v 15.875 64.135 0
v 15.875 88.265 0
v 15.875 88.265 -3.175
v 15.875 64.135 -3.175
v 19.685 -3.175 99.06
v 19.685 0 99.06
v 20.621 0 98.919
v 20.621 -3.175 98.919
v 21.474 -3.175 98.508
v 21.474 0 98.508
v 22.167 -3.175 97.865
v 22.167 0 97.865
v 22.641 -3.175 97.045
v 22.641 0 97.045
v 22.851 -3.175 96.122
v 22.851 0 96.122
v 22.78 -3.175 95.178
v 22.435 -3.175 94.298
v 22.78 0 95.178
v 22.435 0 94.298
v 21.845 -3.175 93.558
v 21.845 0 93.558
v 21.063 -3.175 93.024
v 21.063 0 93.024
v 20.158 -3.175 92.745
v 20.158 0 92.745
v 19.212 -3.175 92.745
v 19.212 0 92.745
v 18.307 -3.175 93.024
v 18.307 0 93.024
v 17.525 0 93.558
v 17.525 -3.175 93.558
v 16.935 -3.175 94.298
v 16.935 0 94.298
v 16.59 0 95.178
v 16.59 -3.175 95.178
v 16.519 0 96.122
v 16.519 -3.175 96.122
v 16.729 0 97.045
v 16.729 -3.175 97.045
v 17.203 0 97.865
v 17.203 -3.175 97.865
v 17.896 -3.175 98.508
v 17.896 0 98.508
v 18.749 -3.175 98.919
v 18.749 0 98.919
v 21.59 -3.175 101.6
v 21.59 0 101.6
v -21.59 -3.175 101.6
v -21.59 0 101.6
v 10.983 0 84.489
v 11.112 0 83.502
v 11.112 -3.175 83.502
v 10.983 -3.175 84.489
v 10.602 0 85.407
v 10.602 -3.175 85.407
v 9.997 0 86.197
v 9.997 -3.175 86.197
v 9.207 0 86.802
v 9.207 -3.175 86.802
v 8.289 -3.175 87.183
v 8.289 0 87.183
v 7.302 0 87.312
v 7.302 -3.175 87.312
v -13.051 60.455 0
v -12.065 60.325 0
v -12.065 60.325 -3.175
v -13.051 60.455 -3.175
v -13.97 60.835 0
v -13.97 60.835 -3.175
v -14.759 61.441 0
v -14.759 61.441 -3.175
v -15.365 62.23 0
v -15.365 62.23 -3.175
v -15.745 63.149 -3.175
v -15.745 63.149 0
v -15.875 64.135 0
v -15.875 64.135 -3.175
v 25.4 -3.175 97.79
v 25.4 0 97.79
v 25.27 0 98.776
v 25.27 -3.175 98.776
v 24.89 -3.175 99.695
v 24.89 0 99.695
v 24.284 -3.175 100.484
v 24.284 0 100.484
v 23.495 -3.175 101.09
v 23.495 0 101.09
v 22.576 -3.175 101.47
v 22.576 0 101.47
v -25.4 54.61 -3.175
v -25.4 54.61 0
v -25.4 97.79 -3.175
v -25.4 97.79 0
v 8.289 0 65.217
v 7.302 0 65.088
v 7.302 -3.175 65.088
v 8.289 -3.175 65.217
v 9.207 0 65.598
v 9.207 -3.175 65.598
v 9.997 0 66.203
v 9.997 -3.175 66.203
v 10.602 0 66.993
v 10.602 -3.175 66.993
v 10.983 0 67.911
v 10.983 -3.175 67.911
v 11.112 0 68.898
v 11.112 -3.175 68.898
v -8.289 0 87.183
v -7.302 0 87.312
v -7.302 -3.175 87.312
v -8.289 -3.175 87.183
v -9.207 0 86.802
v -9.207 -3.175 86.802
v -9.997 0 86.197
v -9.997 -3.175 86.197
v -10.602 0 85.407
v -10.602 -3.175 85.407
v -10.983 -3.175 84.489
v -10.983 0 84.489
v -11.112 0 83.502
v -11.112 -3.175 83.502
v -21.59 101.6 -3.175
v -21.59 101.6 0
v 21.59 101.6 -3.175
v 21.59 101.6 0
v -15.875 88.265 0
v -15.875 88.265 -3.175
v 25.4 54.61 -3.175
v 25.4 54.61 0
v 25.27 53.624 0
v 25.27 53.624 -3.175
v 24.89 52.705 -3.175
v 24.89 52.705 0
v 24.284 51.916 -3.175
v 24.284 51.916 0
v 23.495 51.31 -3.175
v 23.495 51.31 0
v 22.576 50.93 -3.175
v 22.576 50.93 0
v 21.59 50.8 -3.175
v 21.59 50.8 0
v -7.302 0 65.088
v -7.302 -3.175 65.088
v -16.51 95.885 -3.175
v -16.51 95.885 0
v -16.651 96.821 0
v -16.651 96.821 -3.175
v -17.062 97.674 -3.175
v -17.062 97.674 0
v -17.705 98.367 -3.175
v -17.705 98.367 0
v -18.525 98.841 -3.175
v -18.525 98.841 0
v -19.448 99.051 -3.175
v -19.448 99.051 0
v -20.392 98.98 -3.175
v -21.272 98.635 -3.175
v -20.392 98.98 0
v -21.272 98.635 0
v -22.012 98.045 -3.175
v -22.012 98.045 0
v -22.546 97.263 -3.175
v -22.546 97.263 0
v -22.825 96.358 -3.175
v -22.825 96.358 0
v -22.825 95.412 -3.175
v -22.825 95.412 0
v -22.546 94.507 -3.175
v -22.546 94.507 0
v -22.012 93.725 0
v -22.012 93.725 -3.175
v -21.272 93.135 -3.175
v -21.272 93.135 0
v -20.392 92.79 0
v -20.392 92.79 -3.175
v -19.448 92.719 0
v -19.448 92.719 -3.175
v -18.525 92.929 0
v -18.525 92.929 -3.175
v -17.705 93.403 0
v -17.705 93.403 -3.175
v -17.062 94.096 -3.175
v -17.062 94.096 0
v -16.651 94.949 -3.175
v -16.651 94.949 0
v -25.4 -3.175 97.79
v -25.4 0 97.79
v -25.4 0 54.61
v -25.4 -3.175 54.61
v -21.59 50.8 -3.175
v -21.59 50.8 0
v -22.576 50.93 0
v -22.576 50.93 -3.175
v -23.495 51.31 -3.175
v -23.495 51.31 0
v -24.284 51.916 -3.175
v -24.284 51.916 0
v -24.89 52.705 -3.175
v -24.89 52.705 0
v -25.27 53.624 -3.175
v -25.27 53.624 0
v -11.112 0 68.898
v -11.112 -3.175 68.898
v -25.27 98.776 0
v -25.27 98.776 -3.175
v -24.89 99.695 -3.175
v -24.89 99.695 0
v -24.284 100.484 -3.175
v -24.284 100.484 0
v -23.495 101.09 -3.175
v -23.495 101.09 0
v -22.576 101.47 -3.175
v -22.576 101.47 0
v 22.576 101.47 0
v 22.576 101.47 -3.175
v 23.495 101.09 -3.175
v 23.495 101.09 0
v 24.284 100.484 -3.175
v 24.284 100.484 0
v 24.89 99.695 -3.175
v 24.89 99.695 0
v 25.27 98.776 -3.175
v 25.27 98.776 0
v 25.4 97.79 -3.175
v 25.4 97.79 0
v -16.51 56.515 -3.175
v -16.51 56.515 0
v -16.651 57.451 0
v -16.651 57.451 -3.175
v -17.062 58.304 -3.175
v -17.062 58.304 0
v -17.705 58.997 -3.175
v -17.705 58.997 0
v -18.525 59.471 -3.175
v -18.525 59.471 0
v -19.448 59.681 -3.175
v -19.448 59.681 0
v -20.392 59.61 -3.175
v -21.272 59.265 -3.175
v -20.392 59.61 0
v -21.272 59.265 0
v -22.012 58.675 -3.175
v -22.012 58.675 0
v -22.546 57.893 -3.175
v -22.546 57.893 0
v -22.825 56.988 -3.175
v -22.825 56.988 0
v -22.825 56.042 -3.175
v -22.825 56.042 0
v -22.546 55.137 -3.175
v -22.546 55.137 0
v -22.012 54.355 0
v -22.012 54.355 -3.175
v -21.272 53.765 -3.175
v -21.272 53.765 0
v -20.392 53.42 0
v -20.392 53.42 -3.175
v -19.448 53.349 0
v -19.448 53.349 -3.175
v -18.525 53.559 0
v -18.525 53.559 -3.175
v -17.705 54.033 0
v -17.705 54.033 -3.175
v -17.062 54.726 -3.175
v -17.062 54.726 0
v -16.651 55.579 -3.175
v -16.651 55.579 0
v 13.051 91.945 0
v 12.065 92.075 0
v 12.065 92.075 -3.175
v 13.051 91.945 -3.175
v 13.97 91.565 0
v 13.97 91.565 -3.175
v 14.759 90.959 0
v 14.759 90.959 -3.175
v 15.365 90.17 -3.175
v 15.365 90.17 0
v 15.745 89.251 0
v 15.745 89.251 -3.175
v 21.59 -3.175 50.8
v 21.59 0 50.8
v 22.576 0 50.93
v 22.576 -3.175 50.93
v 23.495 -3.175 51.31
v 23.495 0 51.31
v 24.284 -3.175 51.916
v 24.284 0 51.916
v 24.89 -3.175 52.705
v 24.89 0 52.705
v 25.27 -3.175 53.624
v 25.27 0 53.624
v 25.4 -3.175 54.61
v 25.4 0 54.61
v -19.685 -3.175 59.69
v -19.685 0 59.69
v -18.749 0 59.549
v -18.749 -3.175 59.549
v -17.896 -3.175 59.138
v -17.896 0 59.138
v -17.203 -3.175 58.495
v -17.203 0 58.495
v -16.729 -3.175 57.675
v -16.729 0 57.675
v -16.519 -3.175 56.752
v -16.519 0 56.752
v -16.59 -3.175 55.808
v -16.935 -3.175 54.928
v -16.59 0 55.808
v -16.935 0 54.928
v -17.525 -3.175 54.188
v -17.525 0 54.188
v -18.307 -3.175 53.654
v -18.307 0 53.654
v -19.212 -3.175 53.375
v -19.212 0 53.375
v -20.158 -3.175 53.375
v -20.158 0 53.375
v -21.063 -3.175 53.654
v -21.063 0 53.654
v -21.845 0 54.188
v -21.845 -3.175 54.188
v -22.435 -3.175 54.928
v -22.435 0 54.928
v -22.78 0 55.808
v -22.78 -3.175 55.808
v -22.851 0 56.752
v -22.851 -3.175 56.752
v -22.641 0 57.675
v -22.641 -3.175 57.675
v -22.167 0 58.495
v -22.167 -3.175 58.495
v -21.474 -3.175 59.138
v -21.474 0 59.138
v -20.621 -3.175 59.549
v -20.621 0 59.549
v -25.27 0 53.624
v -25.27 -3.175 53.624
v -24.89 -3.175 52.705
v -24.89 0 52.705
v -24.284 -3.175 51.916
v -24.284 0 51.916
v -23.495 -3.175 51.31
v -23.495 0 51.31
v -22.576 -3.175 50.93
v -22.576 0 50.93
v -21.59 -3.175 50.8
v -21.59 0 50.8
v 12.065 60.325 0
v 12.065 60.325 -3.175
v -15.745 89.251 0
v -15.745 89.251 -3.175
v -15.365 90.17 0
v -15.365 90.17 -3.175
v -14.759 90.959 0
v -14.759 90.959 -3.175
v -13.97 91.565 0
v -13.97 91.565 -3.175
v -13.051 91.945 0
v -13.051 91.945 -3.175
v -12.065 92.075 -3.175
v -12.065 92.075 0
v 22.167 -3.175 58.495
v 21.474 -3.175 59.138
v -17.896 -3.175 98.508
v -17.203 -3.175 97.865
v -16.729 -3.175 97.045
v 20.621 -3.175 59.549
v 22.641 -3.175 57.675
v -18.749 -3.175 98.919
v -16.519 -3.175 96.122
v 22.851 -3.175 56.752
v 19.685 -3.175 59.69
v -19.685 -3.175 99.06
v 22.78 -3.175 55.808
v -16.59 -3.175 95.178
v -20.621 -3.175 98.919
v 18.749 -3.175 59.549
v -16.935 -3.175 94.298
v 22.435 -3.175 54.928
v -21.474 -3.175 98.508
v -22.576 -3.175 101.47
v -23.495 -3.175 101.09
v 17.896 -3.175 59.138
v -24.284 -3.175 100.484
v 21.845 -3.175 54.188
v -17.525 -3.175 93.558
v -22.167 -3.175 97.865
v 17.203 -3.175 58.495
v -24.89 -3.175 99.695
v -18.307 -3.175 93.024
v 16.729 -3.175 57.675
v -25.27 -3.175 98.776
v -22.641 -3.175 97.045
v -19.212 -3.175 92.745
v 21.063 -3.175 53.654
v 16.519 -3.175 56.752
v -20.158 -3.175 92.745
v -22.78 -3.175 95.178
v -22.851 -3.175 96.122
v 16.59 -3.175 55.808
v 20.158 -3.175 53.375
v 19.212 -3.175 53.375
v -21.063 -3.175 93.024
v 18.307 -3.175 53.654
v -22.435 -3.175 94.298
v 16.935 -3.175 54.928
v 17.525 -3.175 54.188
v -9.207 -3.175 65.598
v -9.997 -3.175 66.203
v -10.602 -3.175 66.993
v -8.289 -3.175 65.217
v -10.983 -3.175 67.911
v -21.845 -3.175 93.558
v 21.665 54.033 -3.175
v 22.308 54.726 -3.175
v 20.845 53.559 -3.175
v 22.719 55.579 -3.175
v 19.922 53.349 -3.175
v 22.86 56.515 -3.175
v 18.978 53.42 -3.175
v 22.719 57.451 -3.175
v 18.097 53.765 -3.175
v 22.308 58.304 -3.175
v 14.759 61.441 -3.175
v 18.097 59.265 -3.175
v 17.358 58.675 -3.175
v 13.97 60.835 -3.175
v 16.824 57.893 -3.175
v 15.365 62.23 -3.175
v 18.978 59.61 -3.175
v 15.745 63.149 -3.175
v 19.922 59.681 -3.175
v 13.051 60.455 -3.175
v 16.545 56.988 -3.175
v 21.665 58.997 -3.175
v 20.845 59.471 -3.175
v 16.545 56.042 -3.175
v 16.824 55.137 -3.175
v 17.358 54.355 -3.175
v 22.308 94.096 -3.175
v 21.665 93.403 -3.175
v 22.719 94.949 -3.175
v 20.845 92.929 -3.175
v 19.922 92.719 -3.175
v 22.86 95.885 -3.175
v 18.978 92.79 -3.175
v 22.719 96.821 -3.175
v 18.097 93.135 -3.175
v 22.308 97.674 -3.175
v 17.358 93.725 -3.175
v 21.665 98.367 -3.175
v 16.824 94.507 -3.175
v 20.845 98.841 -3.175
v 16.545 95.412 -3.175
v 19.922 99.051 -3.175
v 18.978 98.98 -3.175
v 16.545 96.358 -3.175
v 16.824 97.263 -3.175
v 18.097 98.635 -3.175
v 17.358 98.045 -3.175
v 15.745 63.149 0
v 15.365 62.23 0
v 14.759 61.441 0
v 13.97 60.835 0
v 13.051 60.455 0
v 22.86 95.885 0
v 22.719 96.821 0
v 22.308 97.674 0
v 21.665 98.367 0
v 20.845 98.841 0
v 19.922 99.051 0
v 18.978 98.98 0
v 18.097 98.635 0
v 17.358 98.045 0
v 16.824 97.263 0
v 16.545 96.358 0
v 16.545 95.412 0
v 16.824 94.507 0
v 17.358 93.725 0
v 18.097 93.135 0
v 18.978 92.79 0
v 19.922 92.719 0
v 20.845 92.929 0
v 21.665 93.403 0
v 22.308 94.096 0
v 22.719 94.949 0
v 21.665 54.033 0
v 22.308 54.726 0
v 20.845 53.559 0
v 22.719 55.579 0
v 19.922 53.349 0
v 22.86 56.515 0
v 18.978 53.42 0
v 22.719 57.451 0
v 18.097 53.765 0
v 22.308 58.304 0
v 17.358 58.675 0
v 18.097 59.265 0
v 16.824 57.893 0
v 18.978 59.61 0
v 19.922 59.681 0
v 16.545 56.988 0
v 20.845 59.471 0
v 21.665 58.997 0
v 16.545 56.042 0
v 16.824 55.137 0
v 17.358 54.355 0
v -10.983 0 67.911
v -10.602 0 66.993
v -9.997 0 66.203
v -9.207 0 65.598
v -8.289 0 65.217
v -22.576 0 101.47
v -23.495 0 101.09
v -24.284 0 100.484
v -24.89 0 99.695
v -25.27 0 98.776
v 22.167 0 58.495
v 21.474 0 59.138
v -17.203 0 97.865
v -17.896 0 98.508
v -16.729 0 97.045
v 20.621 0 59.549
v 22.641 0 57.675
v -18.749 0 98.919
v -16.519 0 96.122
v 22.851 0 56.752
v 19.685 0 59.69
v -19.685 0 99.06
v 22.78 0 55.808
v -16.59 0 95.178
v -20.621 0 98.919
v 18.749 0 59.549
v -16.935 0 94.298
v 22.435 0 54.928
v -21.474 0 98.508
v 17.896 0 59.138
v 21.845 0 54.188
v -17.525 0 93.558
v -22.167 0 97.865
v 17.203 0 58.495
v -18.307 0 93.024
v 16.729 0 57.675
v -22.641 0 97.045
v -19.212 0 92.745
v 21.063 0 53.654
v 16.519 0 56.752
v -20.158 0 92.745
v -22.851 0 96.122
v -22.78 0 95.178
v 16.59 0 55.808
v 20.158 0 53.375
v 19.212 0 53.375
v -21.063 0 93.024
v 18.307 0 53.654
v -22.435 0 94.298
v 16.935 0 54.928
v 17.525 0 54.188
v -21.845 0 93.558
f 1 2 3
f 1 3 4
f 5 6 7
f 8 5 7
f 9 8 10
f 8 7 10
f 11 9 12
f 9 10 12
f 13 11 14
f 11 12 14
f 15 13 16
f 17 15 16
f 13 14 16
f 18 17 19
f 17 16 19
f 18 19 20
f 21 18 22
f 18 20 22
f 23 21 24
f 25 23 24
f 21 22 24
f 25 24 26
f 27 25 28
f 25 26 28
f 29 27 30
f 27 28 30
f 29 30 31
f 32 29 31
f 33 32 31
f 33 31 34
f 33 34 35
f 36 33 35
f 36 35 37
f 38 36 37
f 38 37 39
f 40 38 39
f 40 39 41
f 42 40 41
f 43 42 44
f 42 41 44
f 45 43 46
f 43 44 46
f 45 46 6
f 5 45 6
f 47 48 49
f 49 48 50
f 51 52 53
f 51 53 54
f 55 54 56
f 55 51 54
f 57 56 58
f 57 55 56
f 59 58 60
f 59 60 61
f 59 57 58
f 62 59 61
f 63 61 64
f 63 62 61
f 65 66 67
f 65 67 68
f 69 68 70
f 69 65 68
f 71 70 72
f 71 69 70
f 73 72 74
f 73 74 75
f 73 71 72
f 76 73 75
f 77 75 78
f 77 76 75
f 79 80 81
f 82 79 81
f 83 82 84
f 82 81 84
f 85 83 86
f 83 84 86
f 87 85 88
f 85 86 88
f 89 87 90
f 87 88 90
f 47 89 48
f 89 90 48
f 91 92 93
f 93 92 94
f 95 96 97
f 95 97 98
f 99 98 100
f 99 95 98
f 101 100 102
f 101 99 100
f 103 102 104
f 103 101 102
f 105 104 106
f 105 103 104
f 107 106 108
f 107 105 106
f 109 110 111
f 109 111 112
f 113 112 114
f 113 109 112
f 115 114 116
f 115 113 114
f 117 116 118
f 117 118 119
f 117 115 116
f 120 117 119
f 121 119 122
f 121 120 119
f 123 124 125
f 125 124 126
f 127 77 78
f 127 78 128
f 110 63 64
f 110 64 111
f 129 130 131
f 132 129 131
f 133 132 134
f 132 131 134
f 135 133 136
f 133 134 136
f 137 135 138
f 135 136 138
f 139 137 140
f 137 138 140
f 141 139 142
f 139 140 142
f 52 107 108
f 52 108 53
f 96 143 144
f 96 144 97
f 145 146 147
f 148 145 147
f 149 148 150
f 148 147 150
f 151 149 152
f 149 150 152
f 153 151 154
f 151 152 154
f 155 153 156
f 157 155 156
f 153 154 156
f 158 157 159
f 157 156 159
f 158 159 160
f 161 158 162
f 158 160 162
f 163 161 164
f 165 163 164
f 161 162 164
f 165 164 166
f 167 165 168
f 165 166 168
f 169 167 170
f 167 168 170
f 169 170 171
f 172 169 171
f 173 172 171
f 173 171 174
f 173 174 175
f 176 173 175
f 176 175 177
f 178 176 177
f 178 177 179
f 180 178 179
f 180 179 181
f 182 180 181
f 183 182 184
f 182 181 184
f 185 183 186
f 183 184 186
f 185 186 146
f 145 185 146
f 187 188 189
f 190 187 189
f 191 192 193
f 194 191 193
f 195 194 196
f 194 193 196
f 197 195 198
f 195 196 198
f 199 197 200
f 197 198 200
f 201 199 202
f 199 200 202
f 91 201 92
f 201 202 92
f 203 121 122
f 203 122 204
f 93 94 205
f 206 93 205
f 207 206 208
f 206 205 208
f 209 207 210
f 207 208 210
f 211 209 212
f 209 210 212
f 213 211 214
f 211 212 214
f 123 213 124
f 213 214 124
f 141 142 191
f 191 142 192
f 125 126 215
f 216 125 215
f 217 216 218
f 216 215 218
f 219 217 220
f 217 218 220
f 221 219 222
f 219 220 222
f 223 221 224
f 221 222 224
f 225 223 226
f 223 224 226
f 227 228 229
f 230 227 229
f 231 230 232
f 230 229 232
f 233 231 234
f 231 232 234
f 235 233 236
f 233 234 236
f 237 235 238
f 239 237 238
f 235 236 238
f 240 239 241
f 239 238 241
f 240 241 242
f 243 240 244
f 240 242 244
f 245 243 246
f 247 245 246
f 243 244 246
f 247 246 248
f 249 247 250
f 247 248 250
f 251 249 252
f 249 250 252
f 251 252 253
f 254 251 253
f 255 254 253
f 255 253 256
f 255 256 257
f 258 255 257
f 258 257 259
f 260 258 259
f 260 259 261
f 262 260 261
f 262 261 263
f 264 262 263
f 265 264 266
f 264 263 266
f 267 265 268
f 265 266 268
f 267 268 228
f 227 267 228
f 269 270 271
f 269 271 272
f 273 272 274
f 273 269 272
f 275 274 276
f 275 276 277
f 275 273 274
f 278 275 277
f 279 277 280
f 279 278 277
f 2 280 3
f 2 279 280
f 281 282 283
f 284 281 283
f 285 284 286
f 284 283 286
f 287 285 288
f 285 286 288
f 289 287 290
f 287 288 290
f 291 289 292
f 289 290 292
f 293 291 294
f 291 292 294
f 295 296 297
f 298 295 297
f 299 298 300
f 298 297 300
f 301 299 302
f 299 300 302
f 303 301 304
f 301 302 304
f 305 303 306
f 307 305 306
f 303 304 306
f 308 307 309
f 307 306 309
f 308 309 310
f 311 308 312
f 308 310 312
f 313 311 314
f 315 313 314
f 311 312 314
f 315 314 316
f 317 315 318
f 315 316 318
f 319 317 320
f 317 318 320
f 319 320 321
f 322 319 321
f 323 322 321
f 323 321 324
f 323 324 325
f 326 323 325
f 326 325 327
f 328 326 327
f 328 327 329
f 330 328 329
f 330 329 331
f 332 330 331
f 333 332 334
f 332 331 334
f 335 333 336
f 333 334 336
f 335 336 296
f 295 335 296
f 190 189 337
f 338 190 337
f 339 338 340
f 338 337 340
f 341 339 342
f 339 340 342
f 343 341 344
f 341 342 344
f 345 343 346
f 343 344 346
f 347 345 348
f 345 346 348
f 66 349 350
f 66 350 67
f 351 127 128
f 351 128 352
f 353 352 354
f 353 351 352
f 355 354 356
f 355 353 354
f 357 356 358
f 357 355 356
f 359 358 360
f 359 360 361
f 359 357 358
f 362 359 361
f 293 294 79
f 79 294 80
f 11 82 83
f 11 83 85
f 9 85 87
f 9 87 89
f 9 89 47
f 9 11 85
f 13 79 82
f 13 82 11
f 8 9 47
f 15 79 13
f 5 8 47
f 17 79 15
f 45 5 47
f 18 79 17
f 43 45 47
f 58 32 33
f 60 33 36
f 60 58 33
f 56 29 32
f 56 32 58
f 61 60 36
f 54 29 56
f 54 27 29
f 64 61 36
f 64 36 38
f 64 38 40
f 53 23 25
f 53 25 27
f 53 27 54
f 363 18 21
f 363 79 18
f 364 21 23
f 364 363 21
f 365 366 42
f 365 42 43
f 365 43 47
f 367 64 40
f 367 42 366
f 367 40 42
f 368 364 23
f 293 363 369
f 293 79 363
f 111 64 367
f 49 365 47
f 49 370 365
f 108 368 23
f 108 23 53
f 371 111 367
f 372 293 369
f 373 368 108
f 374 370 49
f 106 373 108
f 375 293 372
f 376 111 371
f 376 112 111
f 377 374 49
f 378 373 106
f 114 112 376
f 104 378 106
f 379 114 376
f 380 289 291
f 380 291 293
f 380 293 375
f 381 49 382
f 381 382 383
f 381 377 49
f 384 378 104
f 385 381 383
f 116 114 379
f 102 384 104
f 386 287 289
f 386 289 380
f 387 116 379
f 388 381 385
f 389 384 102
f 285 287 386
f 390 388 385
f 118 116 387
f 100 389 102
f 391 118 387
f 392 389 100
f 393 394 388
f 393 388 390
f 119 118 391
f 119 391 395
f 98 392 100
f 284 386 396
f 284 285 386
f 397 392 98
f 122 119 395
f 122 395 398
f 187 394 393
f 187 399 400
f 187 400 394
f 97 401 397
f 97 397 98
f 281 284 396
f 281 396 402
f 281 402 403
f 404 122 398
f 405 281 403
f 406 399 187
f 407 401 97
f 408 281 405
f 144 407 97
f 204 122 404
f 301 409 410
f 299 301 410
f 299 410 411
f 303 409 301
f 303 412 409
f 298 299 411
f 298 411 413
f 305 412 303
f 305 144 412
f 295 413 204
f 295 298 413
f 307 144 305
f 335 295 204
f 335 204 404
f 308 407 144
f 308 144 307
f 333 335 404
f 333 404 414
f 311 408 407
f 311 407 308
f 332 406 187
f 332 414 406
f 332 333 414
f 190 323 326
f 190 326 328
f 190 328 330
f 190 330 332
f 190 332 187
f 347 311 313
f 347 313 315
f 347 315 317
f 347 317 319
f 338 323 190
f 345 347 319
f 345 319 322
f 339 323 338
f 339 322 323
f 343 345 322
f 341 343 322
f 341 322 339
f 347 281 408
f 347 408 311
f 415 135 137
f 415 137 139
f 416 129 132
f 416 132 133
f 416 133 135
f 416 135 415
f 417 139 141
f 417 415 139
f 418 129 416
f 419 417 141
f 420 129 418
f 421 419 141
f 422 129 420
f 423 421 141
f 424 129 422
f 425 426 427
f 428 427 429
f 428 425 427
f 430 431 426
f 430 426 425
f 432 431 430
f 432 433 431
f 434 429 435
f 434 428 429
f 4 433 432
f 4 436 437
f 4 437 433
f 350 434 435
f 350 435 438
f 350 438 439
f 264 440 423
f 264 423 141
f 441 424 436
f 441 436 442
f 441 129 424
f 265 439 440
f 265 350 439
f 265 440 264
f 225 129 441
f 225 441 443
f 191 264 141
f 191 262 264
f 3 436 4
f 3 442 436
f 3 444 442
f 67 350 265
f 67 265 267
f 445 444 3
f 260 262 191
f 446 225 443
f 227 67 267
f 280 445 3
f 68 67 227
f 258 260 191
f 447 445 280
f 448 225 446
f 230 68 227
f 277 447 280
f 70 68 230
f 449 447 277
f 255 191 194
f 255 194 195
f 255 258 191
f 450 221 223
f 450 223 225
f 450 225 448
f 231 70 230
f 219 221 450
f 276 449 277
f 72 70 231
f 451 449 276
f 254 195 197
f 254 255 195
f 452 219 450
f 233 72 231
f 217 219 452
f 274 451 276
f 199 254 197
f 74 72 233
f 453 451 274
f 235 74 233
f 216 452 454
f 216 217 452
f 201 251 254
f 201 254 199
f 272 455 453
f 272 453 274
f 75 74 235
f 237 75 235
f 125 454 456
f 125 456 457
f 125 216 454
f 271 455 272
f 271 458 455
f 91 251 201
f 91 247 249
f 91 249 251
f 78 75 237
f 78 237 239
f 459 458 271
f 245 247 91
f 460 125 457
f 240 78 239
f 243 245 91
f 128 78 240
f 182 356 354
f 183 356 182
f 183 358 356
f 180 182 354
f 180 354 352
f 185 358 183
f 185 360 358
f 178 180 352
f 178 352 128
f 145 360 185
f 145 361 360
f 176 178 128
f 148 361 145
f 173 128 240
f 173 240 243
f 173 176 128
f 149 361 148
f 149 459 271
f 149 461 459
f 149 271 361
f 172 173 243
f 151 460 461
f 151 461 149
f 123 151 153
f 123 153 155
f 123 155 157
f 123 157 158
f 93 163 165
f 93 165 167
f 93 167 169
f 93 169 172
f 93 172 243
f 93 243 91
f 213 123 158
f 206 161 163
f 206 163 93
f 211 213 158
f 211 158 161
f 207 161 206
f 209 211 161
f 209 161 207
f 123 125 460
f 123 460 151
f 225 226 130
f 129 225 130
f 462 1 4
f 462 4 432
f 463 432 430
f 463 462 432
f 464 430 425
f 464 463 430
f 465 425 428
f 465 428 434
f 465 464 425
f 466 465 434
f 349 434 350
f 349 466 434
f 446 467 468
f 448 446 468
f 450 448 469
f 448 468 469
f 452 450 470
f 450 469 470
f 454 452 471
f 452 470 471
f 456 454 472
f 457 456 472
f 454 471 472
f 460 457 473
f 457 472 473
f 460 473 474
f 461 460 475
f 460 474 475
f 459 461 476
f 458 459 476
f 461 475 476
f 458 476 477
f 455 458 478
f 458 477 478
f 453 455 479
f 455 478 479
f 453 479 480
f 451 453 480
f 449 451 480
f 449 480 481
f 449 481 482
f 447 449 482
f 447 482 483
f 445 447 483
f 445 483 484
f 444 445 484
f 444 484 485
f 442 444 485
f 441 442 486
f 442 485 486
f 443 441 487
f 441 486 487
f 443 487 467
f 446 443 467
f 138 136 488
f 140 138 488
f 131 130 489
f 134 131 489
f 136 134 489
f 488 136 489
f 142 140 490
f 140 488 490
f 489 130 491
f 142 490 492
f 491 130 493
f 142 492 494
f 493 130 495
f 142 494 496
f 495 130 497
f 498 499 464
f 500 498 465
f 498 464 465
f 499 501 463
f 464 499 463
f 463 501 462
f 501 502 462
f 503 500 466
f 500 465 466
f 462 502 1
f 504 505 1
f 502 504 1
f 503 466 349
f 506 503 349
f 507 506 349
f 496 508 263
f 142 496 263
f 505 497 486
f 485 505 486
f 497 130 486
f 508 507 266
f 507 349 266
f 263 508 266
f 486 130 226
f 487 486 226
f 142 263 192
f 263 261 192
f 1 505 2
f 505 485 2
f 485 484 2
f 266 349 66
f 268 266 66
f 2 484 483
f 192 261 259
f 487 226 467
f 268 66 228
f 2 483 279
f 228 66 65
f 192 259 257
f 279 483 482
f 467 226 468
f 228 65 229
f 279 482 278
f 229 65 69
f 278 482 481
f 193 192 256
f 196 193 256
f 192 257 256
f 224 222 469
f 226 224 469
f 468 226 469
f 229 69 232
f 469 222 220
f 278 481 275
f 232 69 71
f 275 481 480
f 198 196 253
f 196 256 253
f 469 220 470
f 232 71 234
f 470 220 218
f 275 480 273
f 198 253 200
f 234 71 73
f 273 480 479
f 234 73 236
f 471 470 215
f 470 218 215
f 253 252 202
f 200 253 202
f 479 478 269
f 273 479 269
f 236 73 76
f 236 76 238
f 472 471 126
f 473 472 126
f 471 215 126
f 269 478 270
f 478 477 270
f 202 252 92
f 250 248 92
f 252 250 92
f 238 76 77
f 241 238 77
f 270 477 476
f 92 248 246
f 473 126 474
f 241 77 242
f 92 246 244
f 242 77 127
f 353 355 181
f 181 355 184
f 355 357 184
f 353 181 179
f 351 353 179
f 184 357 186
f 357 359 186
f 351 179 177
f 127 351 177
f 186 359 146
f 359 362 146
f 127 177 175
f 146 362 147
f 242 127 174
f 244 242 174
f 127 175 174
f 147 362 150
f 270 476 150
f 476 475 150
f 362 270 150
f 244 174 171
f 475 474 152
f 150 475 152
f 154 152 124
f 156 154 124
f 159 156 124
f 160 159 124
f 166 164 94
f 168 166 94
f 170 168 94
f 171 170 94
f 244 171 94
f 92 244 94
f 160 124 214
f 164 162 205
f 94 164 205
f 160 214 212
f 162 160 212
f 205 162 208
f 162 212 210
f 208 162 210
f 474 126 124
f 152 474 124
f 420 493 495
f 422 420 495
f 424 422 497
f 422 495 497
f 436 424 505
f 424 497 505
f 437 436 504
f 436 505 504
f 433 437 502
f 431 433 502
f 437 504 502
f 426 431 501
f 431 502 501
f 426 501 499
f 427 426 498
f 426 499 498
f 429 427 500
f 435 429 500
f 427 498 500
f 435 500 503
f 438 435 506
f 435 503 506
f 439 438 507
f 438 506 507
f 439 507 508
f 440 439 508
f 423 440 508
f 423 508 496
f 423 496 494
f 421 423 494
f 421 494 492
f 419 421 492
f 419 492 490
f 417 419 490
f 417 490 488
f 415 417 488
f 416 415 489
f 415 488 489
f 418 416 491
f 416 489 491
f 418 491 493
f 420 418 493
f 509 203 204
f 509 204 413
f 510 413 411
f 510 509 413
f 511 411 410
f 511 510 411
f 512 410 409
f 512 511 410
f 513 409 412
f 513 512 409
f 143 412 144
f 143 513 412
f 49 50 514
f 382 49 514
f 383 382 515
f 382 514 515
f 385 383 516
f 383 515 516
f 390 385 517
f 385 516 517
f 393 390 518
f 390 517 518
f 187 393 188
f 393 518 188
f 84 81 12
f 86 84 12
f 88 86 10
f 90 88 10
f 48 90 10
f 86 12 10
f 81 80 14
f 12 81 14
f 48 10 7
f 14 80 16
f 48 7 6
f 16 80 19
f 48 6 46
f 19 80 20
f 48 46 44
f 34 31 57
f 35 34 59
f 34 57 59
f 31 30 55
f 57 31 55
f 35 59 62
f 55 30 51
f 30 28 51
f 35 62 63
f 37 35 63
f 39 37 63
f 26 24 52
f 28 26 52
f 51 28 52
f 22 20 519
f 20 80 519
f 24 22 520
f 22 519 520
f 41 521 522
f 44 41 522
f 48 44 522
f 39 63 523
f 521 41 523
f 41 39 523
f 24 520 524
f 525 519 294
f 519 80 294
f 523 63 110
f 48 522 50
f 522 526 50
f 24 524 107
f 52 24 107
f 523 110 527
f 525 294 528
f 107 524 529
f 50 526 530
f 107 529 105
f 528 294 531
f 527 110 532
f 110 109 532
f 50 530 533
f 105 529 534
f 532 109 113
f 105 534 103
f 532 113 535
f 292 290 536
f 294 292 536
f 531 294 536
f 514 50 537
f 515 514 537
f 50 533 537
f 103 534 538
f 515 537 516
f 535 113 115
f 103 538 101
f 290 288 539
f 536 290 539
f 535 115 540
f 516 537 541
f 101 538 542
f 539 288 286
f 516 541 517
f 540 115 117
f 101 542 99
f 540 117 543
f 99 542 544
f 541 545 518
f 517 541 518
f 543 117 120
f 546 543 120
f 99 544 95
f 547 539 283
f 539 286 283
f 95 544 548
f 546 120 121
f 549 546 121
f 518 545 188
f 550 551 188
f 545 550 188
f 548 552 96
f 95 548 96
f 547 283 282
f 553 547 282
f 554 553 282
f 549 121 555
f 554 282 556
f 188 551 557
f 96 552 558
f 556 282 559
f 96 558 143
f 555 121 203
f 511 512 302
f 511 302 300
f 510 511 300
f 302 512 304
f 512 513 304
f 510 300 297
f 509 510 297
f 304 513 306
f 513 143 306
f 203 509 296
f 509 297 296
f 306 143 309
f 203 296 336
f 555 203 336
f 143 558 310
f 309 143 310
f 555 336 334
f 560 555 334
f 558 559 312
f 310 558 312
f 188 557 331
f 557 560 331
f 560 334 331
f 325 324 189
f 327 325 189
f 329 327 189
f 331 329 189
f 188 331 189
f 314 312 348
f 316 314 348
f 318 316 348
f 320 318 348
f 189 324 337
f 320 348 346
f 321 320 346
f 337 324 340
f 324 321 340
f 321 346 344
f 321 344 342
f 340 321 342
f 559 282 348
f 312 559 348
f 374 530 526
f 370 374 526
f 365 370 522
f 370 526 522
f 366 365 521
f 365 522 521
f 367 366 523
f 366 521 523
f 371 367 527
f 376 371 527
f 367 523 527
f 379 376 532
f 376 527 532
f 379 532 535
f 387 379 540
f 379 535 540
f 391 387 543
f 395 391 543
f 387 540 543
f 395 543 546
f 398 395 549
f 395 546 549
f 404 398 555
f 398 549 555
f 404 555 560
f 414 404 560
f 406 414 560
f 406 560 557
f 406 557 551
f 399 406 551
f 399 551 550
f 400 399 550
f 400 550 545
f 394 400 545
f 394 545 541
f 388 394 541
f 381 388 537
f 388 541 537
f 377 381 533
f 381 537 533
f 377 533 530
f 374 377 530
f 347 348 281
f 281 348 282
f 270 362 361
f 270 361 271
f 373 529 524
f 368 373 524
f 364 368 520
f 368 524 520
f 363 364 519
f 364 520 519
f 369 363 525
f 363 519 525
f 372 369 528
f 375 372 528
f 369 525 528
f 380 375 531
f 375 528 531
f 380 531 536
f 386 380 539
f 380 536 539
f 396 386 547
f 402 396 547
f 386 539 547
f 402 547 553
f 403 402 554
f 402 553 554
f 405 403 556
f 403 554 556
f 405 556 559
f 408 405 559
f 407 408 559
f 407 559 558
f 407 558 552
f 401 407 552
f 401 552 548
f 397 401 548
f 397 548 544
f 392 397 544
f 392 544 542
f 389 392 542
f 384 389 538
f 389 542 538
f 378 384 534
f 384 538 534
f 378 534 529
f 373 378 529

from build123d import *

# Parameters (mm, degrees)
SKETCH1_R           = 3.175
TOP_FLANGE_DEPTH    = 3.175
SKETCH2_R           = 3.175
BOTTOM_FLANGE_DEPTH = 3.175


with BuildPart() as part:
    # Sketch1 → Top-Flange (new body)
    with BuildSketch(Plane.XY):
        with BuildLine():
            Line((-21.59, 101.6), (21.59, 101.6))
            ThreePointArc((21.59, 101.6), (24.284076836, 100.484076836), (25.4, 97.79))
            Line((25.4, 97.79), (25.4, 54.61))
            ThreePointArc((25.4, 54.61), (24.284076836, 51.915923164), (21.59, 50.8))
            Line((21.59, 50.8), (-21.59, 50.8))
            ThreePointArc((-21.59, 50.8), (-24.284076836, 51.915923164), (-25.4, 54.61))
            Line((-25.4, 54.61), (-25.4, 97.79))
            ThreePointArc((-25.4, 97.79), (-24.284076836, 100.484076836), (-21.59, 101.6))
        make_face()
        with Locations((-19.685, 95.885)):
            Circle(SKETCH1_R, mode=Mode.SUBTRACT)
        with Locations((19.685, 95.885)):
            Circle(SKETCH1_R, mode=Mode.SUBTRACT)
        with Locations((-19.685, 56.515)):
            Circle(SKETCH1_R, mode=Mode.SUBTRACT)
        with Locations((19.685, 56.515)):
            Circle(SKETCH1_R, mode=Mode.SUBTRACT)
        with BuildLine():
            Line((-12.065, 92.075), (12.065, 92.075))
            ThreePointArc((12.065, 92.075), (14.759076836, 90.959076836), (15.875, 88.265))
            Line((15.875, 88.265), (15.875, 64.135))
            ThreePointArc((15.875, 64.135), (14.759076836, 61.440923164), (12.065, 60.325))
            Line((12.065, 60.325), (-12.065, 60.325))
            ThreePointArc((-12.065, 60.325), (-14.759076836, 61.440923164), (-15.875, 64.135))
            Line((-15.875, 64.135), (-15.875, 88.265))
            ThreePointArc((-15.875, 88.265), (-14.759076836, 90.959076836), (-12.065, 92.075))
        make_face(mode=Mode.SUBTRACT)
    extrude(amount=-TOP_FLANGE_DEPTH)


with BuildPart() as body_2:
    # Sketch2 → Bottom-Flange (new body)
    with BuildSketch(Plane(origin=(0, 0, 0), x_dir=(1, 0, 0), z_dir=(0, 1, 0))):
        with BuildLine():
            Line((-21.59, -50.8), (21.59, -50.8))
            ThreePointArc((21.59, -50.8), (24.284076836, -51.915923164), (25.4, -54.61))
            Line((25.4, -54.61), (25.4, -97.79))
            ThreePointArc((25.4, -97.79), (24.284076836, -100.484076836), (21.59, -101.6))
            Line((21.59, -101.6), (-21.59, -101.6))
            ThreePointArc((-21.59, -101.6), (-24.284076836, -100.484076836), (-25.4, -97.79))
            Line((-25.4, -97.79), (-25.4, -54.61))
            ThreePointArc((-25.4, -54.61), (-24.284076836, -51.915923164), (-21.59, -50.8))
        make_face()
        with Locations(Location((-19.685, -56.515, 0), (0, 0, 270))):  # turned: the seam where the file's is
            Circle(SKETCH2_R, mode=Mode.SUBTRACT)
        with Locations(Location((19.685, -56.515, 0), (0, 0, 270))):  # turned: the seam where the file's is
            Circle(SKETCH2_R, mode=Mode.SUBTRACT)
        with Locations(Location((-19.685, -95.885, 0), (0, 0, 270))):  # turned: the seam where the file's is
            Circle(SKETCH2_R, mode=Mode.SUBTRACT)
        with Locations(Location((19.685, -95.885, 0), (0, 0, 270))):  # turned: the seam where the file's is
            Circle(SKETCH2_R, mode=Mode.SUBTRACT)
        with BuildLine():
            Line((-7.3025, -65.0875), (7.3025, -65.0875))
            ThreePointArc((7.3025, -65.0875), (9.996576836, -66.203423164), (11.1125, -68.8975))
            Line((11.1125, -68.8975), (11.1125, -83.5025))
            ThreePointArc((11.1125, -83.5025), (9.996576836, -86.196576836), (7.3025, -87.3125))
            Line((7.3025, -87.3125), (-7.3025, -87.3125))
            ThreePointArc((-7.3025, -87.3125), (-9.996576836, -86.196576836), (-11.1125, -83.5025))
            Line((-11.1125, -83.5025), (-11.1125, -68.8975))
            ThreePointArc((-11.1125, -68.8975), (-9.996576836, -66.203423164), (-7.3025, -65.0875))
        make_face(mode=Mode.SUBTRACT)
    extrude(amount=-BOTTOM_FLANGE_DEPTH)


solid = Compound([part.part, body_2.part])
